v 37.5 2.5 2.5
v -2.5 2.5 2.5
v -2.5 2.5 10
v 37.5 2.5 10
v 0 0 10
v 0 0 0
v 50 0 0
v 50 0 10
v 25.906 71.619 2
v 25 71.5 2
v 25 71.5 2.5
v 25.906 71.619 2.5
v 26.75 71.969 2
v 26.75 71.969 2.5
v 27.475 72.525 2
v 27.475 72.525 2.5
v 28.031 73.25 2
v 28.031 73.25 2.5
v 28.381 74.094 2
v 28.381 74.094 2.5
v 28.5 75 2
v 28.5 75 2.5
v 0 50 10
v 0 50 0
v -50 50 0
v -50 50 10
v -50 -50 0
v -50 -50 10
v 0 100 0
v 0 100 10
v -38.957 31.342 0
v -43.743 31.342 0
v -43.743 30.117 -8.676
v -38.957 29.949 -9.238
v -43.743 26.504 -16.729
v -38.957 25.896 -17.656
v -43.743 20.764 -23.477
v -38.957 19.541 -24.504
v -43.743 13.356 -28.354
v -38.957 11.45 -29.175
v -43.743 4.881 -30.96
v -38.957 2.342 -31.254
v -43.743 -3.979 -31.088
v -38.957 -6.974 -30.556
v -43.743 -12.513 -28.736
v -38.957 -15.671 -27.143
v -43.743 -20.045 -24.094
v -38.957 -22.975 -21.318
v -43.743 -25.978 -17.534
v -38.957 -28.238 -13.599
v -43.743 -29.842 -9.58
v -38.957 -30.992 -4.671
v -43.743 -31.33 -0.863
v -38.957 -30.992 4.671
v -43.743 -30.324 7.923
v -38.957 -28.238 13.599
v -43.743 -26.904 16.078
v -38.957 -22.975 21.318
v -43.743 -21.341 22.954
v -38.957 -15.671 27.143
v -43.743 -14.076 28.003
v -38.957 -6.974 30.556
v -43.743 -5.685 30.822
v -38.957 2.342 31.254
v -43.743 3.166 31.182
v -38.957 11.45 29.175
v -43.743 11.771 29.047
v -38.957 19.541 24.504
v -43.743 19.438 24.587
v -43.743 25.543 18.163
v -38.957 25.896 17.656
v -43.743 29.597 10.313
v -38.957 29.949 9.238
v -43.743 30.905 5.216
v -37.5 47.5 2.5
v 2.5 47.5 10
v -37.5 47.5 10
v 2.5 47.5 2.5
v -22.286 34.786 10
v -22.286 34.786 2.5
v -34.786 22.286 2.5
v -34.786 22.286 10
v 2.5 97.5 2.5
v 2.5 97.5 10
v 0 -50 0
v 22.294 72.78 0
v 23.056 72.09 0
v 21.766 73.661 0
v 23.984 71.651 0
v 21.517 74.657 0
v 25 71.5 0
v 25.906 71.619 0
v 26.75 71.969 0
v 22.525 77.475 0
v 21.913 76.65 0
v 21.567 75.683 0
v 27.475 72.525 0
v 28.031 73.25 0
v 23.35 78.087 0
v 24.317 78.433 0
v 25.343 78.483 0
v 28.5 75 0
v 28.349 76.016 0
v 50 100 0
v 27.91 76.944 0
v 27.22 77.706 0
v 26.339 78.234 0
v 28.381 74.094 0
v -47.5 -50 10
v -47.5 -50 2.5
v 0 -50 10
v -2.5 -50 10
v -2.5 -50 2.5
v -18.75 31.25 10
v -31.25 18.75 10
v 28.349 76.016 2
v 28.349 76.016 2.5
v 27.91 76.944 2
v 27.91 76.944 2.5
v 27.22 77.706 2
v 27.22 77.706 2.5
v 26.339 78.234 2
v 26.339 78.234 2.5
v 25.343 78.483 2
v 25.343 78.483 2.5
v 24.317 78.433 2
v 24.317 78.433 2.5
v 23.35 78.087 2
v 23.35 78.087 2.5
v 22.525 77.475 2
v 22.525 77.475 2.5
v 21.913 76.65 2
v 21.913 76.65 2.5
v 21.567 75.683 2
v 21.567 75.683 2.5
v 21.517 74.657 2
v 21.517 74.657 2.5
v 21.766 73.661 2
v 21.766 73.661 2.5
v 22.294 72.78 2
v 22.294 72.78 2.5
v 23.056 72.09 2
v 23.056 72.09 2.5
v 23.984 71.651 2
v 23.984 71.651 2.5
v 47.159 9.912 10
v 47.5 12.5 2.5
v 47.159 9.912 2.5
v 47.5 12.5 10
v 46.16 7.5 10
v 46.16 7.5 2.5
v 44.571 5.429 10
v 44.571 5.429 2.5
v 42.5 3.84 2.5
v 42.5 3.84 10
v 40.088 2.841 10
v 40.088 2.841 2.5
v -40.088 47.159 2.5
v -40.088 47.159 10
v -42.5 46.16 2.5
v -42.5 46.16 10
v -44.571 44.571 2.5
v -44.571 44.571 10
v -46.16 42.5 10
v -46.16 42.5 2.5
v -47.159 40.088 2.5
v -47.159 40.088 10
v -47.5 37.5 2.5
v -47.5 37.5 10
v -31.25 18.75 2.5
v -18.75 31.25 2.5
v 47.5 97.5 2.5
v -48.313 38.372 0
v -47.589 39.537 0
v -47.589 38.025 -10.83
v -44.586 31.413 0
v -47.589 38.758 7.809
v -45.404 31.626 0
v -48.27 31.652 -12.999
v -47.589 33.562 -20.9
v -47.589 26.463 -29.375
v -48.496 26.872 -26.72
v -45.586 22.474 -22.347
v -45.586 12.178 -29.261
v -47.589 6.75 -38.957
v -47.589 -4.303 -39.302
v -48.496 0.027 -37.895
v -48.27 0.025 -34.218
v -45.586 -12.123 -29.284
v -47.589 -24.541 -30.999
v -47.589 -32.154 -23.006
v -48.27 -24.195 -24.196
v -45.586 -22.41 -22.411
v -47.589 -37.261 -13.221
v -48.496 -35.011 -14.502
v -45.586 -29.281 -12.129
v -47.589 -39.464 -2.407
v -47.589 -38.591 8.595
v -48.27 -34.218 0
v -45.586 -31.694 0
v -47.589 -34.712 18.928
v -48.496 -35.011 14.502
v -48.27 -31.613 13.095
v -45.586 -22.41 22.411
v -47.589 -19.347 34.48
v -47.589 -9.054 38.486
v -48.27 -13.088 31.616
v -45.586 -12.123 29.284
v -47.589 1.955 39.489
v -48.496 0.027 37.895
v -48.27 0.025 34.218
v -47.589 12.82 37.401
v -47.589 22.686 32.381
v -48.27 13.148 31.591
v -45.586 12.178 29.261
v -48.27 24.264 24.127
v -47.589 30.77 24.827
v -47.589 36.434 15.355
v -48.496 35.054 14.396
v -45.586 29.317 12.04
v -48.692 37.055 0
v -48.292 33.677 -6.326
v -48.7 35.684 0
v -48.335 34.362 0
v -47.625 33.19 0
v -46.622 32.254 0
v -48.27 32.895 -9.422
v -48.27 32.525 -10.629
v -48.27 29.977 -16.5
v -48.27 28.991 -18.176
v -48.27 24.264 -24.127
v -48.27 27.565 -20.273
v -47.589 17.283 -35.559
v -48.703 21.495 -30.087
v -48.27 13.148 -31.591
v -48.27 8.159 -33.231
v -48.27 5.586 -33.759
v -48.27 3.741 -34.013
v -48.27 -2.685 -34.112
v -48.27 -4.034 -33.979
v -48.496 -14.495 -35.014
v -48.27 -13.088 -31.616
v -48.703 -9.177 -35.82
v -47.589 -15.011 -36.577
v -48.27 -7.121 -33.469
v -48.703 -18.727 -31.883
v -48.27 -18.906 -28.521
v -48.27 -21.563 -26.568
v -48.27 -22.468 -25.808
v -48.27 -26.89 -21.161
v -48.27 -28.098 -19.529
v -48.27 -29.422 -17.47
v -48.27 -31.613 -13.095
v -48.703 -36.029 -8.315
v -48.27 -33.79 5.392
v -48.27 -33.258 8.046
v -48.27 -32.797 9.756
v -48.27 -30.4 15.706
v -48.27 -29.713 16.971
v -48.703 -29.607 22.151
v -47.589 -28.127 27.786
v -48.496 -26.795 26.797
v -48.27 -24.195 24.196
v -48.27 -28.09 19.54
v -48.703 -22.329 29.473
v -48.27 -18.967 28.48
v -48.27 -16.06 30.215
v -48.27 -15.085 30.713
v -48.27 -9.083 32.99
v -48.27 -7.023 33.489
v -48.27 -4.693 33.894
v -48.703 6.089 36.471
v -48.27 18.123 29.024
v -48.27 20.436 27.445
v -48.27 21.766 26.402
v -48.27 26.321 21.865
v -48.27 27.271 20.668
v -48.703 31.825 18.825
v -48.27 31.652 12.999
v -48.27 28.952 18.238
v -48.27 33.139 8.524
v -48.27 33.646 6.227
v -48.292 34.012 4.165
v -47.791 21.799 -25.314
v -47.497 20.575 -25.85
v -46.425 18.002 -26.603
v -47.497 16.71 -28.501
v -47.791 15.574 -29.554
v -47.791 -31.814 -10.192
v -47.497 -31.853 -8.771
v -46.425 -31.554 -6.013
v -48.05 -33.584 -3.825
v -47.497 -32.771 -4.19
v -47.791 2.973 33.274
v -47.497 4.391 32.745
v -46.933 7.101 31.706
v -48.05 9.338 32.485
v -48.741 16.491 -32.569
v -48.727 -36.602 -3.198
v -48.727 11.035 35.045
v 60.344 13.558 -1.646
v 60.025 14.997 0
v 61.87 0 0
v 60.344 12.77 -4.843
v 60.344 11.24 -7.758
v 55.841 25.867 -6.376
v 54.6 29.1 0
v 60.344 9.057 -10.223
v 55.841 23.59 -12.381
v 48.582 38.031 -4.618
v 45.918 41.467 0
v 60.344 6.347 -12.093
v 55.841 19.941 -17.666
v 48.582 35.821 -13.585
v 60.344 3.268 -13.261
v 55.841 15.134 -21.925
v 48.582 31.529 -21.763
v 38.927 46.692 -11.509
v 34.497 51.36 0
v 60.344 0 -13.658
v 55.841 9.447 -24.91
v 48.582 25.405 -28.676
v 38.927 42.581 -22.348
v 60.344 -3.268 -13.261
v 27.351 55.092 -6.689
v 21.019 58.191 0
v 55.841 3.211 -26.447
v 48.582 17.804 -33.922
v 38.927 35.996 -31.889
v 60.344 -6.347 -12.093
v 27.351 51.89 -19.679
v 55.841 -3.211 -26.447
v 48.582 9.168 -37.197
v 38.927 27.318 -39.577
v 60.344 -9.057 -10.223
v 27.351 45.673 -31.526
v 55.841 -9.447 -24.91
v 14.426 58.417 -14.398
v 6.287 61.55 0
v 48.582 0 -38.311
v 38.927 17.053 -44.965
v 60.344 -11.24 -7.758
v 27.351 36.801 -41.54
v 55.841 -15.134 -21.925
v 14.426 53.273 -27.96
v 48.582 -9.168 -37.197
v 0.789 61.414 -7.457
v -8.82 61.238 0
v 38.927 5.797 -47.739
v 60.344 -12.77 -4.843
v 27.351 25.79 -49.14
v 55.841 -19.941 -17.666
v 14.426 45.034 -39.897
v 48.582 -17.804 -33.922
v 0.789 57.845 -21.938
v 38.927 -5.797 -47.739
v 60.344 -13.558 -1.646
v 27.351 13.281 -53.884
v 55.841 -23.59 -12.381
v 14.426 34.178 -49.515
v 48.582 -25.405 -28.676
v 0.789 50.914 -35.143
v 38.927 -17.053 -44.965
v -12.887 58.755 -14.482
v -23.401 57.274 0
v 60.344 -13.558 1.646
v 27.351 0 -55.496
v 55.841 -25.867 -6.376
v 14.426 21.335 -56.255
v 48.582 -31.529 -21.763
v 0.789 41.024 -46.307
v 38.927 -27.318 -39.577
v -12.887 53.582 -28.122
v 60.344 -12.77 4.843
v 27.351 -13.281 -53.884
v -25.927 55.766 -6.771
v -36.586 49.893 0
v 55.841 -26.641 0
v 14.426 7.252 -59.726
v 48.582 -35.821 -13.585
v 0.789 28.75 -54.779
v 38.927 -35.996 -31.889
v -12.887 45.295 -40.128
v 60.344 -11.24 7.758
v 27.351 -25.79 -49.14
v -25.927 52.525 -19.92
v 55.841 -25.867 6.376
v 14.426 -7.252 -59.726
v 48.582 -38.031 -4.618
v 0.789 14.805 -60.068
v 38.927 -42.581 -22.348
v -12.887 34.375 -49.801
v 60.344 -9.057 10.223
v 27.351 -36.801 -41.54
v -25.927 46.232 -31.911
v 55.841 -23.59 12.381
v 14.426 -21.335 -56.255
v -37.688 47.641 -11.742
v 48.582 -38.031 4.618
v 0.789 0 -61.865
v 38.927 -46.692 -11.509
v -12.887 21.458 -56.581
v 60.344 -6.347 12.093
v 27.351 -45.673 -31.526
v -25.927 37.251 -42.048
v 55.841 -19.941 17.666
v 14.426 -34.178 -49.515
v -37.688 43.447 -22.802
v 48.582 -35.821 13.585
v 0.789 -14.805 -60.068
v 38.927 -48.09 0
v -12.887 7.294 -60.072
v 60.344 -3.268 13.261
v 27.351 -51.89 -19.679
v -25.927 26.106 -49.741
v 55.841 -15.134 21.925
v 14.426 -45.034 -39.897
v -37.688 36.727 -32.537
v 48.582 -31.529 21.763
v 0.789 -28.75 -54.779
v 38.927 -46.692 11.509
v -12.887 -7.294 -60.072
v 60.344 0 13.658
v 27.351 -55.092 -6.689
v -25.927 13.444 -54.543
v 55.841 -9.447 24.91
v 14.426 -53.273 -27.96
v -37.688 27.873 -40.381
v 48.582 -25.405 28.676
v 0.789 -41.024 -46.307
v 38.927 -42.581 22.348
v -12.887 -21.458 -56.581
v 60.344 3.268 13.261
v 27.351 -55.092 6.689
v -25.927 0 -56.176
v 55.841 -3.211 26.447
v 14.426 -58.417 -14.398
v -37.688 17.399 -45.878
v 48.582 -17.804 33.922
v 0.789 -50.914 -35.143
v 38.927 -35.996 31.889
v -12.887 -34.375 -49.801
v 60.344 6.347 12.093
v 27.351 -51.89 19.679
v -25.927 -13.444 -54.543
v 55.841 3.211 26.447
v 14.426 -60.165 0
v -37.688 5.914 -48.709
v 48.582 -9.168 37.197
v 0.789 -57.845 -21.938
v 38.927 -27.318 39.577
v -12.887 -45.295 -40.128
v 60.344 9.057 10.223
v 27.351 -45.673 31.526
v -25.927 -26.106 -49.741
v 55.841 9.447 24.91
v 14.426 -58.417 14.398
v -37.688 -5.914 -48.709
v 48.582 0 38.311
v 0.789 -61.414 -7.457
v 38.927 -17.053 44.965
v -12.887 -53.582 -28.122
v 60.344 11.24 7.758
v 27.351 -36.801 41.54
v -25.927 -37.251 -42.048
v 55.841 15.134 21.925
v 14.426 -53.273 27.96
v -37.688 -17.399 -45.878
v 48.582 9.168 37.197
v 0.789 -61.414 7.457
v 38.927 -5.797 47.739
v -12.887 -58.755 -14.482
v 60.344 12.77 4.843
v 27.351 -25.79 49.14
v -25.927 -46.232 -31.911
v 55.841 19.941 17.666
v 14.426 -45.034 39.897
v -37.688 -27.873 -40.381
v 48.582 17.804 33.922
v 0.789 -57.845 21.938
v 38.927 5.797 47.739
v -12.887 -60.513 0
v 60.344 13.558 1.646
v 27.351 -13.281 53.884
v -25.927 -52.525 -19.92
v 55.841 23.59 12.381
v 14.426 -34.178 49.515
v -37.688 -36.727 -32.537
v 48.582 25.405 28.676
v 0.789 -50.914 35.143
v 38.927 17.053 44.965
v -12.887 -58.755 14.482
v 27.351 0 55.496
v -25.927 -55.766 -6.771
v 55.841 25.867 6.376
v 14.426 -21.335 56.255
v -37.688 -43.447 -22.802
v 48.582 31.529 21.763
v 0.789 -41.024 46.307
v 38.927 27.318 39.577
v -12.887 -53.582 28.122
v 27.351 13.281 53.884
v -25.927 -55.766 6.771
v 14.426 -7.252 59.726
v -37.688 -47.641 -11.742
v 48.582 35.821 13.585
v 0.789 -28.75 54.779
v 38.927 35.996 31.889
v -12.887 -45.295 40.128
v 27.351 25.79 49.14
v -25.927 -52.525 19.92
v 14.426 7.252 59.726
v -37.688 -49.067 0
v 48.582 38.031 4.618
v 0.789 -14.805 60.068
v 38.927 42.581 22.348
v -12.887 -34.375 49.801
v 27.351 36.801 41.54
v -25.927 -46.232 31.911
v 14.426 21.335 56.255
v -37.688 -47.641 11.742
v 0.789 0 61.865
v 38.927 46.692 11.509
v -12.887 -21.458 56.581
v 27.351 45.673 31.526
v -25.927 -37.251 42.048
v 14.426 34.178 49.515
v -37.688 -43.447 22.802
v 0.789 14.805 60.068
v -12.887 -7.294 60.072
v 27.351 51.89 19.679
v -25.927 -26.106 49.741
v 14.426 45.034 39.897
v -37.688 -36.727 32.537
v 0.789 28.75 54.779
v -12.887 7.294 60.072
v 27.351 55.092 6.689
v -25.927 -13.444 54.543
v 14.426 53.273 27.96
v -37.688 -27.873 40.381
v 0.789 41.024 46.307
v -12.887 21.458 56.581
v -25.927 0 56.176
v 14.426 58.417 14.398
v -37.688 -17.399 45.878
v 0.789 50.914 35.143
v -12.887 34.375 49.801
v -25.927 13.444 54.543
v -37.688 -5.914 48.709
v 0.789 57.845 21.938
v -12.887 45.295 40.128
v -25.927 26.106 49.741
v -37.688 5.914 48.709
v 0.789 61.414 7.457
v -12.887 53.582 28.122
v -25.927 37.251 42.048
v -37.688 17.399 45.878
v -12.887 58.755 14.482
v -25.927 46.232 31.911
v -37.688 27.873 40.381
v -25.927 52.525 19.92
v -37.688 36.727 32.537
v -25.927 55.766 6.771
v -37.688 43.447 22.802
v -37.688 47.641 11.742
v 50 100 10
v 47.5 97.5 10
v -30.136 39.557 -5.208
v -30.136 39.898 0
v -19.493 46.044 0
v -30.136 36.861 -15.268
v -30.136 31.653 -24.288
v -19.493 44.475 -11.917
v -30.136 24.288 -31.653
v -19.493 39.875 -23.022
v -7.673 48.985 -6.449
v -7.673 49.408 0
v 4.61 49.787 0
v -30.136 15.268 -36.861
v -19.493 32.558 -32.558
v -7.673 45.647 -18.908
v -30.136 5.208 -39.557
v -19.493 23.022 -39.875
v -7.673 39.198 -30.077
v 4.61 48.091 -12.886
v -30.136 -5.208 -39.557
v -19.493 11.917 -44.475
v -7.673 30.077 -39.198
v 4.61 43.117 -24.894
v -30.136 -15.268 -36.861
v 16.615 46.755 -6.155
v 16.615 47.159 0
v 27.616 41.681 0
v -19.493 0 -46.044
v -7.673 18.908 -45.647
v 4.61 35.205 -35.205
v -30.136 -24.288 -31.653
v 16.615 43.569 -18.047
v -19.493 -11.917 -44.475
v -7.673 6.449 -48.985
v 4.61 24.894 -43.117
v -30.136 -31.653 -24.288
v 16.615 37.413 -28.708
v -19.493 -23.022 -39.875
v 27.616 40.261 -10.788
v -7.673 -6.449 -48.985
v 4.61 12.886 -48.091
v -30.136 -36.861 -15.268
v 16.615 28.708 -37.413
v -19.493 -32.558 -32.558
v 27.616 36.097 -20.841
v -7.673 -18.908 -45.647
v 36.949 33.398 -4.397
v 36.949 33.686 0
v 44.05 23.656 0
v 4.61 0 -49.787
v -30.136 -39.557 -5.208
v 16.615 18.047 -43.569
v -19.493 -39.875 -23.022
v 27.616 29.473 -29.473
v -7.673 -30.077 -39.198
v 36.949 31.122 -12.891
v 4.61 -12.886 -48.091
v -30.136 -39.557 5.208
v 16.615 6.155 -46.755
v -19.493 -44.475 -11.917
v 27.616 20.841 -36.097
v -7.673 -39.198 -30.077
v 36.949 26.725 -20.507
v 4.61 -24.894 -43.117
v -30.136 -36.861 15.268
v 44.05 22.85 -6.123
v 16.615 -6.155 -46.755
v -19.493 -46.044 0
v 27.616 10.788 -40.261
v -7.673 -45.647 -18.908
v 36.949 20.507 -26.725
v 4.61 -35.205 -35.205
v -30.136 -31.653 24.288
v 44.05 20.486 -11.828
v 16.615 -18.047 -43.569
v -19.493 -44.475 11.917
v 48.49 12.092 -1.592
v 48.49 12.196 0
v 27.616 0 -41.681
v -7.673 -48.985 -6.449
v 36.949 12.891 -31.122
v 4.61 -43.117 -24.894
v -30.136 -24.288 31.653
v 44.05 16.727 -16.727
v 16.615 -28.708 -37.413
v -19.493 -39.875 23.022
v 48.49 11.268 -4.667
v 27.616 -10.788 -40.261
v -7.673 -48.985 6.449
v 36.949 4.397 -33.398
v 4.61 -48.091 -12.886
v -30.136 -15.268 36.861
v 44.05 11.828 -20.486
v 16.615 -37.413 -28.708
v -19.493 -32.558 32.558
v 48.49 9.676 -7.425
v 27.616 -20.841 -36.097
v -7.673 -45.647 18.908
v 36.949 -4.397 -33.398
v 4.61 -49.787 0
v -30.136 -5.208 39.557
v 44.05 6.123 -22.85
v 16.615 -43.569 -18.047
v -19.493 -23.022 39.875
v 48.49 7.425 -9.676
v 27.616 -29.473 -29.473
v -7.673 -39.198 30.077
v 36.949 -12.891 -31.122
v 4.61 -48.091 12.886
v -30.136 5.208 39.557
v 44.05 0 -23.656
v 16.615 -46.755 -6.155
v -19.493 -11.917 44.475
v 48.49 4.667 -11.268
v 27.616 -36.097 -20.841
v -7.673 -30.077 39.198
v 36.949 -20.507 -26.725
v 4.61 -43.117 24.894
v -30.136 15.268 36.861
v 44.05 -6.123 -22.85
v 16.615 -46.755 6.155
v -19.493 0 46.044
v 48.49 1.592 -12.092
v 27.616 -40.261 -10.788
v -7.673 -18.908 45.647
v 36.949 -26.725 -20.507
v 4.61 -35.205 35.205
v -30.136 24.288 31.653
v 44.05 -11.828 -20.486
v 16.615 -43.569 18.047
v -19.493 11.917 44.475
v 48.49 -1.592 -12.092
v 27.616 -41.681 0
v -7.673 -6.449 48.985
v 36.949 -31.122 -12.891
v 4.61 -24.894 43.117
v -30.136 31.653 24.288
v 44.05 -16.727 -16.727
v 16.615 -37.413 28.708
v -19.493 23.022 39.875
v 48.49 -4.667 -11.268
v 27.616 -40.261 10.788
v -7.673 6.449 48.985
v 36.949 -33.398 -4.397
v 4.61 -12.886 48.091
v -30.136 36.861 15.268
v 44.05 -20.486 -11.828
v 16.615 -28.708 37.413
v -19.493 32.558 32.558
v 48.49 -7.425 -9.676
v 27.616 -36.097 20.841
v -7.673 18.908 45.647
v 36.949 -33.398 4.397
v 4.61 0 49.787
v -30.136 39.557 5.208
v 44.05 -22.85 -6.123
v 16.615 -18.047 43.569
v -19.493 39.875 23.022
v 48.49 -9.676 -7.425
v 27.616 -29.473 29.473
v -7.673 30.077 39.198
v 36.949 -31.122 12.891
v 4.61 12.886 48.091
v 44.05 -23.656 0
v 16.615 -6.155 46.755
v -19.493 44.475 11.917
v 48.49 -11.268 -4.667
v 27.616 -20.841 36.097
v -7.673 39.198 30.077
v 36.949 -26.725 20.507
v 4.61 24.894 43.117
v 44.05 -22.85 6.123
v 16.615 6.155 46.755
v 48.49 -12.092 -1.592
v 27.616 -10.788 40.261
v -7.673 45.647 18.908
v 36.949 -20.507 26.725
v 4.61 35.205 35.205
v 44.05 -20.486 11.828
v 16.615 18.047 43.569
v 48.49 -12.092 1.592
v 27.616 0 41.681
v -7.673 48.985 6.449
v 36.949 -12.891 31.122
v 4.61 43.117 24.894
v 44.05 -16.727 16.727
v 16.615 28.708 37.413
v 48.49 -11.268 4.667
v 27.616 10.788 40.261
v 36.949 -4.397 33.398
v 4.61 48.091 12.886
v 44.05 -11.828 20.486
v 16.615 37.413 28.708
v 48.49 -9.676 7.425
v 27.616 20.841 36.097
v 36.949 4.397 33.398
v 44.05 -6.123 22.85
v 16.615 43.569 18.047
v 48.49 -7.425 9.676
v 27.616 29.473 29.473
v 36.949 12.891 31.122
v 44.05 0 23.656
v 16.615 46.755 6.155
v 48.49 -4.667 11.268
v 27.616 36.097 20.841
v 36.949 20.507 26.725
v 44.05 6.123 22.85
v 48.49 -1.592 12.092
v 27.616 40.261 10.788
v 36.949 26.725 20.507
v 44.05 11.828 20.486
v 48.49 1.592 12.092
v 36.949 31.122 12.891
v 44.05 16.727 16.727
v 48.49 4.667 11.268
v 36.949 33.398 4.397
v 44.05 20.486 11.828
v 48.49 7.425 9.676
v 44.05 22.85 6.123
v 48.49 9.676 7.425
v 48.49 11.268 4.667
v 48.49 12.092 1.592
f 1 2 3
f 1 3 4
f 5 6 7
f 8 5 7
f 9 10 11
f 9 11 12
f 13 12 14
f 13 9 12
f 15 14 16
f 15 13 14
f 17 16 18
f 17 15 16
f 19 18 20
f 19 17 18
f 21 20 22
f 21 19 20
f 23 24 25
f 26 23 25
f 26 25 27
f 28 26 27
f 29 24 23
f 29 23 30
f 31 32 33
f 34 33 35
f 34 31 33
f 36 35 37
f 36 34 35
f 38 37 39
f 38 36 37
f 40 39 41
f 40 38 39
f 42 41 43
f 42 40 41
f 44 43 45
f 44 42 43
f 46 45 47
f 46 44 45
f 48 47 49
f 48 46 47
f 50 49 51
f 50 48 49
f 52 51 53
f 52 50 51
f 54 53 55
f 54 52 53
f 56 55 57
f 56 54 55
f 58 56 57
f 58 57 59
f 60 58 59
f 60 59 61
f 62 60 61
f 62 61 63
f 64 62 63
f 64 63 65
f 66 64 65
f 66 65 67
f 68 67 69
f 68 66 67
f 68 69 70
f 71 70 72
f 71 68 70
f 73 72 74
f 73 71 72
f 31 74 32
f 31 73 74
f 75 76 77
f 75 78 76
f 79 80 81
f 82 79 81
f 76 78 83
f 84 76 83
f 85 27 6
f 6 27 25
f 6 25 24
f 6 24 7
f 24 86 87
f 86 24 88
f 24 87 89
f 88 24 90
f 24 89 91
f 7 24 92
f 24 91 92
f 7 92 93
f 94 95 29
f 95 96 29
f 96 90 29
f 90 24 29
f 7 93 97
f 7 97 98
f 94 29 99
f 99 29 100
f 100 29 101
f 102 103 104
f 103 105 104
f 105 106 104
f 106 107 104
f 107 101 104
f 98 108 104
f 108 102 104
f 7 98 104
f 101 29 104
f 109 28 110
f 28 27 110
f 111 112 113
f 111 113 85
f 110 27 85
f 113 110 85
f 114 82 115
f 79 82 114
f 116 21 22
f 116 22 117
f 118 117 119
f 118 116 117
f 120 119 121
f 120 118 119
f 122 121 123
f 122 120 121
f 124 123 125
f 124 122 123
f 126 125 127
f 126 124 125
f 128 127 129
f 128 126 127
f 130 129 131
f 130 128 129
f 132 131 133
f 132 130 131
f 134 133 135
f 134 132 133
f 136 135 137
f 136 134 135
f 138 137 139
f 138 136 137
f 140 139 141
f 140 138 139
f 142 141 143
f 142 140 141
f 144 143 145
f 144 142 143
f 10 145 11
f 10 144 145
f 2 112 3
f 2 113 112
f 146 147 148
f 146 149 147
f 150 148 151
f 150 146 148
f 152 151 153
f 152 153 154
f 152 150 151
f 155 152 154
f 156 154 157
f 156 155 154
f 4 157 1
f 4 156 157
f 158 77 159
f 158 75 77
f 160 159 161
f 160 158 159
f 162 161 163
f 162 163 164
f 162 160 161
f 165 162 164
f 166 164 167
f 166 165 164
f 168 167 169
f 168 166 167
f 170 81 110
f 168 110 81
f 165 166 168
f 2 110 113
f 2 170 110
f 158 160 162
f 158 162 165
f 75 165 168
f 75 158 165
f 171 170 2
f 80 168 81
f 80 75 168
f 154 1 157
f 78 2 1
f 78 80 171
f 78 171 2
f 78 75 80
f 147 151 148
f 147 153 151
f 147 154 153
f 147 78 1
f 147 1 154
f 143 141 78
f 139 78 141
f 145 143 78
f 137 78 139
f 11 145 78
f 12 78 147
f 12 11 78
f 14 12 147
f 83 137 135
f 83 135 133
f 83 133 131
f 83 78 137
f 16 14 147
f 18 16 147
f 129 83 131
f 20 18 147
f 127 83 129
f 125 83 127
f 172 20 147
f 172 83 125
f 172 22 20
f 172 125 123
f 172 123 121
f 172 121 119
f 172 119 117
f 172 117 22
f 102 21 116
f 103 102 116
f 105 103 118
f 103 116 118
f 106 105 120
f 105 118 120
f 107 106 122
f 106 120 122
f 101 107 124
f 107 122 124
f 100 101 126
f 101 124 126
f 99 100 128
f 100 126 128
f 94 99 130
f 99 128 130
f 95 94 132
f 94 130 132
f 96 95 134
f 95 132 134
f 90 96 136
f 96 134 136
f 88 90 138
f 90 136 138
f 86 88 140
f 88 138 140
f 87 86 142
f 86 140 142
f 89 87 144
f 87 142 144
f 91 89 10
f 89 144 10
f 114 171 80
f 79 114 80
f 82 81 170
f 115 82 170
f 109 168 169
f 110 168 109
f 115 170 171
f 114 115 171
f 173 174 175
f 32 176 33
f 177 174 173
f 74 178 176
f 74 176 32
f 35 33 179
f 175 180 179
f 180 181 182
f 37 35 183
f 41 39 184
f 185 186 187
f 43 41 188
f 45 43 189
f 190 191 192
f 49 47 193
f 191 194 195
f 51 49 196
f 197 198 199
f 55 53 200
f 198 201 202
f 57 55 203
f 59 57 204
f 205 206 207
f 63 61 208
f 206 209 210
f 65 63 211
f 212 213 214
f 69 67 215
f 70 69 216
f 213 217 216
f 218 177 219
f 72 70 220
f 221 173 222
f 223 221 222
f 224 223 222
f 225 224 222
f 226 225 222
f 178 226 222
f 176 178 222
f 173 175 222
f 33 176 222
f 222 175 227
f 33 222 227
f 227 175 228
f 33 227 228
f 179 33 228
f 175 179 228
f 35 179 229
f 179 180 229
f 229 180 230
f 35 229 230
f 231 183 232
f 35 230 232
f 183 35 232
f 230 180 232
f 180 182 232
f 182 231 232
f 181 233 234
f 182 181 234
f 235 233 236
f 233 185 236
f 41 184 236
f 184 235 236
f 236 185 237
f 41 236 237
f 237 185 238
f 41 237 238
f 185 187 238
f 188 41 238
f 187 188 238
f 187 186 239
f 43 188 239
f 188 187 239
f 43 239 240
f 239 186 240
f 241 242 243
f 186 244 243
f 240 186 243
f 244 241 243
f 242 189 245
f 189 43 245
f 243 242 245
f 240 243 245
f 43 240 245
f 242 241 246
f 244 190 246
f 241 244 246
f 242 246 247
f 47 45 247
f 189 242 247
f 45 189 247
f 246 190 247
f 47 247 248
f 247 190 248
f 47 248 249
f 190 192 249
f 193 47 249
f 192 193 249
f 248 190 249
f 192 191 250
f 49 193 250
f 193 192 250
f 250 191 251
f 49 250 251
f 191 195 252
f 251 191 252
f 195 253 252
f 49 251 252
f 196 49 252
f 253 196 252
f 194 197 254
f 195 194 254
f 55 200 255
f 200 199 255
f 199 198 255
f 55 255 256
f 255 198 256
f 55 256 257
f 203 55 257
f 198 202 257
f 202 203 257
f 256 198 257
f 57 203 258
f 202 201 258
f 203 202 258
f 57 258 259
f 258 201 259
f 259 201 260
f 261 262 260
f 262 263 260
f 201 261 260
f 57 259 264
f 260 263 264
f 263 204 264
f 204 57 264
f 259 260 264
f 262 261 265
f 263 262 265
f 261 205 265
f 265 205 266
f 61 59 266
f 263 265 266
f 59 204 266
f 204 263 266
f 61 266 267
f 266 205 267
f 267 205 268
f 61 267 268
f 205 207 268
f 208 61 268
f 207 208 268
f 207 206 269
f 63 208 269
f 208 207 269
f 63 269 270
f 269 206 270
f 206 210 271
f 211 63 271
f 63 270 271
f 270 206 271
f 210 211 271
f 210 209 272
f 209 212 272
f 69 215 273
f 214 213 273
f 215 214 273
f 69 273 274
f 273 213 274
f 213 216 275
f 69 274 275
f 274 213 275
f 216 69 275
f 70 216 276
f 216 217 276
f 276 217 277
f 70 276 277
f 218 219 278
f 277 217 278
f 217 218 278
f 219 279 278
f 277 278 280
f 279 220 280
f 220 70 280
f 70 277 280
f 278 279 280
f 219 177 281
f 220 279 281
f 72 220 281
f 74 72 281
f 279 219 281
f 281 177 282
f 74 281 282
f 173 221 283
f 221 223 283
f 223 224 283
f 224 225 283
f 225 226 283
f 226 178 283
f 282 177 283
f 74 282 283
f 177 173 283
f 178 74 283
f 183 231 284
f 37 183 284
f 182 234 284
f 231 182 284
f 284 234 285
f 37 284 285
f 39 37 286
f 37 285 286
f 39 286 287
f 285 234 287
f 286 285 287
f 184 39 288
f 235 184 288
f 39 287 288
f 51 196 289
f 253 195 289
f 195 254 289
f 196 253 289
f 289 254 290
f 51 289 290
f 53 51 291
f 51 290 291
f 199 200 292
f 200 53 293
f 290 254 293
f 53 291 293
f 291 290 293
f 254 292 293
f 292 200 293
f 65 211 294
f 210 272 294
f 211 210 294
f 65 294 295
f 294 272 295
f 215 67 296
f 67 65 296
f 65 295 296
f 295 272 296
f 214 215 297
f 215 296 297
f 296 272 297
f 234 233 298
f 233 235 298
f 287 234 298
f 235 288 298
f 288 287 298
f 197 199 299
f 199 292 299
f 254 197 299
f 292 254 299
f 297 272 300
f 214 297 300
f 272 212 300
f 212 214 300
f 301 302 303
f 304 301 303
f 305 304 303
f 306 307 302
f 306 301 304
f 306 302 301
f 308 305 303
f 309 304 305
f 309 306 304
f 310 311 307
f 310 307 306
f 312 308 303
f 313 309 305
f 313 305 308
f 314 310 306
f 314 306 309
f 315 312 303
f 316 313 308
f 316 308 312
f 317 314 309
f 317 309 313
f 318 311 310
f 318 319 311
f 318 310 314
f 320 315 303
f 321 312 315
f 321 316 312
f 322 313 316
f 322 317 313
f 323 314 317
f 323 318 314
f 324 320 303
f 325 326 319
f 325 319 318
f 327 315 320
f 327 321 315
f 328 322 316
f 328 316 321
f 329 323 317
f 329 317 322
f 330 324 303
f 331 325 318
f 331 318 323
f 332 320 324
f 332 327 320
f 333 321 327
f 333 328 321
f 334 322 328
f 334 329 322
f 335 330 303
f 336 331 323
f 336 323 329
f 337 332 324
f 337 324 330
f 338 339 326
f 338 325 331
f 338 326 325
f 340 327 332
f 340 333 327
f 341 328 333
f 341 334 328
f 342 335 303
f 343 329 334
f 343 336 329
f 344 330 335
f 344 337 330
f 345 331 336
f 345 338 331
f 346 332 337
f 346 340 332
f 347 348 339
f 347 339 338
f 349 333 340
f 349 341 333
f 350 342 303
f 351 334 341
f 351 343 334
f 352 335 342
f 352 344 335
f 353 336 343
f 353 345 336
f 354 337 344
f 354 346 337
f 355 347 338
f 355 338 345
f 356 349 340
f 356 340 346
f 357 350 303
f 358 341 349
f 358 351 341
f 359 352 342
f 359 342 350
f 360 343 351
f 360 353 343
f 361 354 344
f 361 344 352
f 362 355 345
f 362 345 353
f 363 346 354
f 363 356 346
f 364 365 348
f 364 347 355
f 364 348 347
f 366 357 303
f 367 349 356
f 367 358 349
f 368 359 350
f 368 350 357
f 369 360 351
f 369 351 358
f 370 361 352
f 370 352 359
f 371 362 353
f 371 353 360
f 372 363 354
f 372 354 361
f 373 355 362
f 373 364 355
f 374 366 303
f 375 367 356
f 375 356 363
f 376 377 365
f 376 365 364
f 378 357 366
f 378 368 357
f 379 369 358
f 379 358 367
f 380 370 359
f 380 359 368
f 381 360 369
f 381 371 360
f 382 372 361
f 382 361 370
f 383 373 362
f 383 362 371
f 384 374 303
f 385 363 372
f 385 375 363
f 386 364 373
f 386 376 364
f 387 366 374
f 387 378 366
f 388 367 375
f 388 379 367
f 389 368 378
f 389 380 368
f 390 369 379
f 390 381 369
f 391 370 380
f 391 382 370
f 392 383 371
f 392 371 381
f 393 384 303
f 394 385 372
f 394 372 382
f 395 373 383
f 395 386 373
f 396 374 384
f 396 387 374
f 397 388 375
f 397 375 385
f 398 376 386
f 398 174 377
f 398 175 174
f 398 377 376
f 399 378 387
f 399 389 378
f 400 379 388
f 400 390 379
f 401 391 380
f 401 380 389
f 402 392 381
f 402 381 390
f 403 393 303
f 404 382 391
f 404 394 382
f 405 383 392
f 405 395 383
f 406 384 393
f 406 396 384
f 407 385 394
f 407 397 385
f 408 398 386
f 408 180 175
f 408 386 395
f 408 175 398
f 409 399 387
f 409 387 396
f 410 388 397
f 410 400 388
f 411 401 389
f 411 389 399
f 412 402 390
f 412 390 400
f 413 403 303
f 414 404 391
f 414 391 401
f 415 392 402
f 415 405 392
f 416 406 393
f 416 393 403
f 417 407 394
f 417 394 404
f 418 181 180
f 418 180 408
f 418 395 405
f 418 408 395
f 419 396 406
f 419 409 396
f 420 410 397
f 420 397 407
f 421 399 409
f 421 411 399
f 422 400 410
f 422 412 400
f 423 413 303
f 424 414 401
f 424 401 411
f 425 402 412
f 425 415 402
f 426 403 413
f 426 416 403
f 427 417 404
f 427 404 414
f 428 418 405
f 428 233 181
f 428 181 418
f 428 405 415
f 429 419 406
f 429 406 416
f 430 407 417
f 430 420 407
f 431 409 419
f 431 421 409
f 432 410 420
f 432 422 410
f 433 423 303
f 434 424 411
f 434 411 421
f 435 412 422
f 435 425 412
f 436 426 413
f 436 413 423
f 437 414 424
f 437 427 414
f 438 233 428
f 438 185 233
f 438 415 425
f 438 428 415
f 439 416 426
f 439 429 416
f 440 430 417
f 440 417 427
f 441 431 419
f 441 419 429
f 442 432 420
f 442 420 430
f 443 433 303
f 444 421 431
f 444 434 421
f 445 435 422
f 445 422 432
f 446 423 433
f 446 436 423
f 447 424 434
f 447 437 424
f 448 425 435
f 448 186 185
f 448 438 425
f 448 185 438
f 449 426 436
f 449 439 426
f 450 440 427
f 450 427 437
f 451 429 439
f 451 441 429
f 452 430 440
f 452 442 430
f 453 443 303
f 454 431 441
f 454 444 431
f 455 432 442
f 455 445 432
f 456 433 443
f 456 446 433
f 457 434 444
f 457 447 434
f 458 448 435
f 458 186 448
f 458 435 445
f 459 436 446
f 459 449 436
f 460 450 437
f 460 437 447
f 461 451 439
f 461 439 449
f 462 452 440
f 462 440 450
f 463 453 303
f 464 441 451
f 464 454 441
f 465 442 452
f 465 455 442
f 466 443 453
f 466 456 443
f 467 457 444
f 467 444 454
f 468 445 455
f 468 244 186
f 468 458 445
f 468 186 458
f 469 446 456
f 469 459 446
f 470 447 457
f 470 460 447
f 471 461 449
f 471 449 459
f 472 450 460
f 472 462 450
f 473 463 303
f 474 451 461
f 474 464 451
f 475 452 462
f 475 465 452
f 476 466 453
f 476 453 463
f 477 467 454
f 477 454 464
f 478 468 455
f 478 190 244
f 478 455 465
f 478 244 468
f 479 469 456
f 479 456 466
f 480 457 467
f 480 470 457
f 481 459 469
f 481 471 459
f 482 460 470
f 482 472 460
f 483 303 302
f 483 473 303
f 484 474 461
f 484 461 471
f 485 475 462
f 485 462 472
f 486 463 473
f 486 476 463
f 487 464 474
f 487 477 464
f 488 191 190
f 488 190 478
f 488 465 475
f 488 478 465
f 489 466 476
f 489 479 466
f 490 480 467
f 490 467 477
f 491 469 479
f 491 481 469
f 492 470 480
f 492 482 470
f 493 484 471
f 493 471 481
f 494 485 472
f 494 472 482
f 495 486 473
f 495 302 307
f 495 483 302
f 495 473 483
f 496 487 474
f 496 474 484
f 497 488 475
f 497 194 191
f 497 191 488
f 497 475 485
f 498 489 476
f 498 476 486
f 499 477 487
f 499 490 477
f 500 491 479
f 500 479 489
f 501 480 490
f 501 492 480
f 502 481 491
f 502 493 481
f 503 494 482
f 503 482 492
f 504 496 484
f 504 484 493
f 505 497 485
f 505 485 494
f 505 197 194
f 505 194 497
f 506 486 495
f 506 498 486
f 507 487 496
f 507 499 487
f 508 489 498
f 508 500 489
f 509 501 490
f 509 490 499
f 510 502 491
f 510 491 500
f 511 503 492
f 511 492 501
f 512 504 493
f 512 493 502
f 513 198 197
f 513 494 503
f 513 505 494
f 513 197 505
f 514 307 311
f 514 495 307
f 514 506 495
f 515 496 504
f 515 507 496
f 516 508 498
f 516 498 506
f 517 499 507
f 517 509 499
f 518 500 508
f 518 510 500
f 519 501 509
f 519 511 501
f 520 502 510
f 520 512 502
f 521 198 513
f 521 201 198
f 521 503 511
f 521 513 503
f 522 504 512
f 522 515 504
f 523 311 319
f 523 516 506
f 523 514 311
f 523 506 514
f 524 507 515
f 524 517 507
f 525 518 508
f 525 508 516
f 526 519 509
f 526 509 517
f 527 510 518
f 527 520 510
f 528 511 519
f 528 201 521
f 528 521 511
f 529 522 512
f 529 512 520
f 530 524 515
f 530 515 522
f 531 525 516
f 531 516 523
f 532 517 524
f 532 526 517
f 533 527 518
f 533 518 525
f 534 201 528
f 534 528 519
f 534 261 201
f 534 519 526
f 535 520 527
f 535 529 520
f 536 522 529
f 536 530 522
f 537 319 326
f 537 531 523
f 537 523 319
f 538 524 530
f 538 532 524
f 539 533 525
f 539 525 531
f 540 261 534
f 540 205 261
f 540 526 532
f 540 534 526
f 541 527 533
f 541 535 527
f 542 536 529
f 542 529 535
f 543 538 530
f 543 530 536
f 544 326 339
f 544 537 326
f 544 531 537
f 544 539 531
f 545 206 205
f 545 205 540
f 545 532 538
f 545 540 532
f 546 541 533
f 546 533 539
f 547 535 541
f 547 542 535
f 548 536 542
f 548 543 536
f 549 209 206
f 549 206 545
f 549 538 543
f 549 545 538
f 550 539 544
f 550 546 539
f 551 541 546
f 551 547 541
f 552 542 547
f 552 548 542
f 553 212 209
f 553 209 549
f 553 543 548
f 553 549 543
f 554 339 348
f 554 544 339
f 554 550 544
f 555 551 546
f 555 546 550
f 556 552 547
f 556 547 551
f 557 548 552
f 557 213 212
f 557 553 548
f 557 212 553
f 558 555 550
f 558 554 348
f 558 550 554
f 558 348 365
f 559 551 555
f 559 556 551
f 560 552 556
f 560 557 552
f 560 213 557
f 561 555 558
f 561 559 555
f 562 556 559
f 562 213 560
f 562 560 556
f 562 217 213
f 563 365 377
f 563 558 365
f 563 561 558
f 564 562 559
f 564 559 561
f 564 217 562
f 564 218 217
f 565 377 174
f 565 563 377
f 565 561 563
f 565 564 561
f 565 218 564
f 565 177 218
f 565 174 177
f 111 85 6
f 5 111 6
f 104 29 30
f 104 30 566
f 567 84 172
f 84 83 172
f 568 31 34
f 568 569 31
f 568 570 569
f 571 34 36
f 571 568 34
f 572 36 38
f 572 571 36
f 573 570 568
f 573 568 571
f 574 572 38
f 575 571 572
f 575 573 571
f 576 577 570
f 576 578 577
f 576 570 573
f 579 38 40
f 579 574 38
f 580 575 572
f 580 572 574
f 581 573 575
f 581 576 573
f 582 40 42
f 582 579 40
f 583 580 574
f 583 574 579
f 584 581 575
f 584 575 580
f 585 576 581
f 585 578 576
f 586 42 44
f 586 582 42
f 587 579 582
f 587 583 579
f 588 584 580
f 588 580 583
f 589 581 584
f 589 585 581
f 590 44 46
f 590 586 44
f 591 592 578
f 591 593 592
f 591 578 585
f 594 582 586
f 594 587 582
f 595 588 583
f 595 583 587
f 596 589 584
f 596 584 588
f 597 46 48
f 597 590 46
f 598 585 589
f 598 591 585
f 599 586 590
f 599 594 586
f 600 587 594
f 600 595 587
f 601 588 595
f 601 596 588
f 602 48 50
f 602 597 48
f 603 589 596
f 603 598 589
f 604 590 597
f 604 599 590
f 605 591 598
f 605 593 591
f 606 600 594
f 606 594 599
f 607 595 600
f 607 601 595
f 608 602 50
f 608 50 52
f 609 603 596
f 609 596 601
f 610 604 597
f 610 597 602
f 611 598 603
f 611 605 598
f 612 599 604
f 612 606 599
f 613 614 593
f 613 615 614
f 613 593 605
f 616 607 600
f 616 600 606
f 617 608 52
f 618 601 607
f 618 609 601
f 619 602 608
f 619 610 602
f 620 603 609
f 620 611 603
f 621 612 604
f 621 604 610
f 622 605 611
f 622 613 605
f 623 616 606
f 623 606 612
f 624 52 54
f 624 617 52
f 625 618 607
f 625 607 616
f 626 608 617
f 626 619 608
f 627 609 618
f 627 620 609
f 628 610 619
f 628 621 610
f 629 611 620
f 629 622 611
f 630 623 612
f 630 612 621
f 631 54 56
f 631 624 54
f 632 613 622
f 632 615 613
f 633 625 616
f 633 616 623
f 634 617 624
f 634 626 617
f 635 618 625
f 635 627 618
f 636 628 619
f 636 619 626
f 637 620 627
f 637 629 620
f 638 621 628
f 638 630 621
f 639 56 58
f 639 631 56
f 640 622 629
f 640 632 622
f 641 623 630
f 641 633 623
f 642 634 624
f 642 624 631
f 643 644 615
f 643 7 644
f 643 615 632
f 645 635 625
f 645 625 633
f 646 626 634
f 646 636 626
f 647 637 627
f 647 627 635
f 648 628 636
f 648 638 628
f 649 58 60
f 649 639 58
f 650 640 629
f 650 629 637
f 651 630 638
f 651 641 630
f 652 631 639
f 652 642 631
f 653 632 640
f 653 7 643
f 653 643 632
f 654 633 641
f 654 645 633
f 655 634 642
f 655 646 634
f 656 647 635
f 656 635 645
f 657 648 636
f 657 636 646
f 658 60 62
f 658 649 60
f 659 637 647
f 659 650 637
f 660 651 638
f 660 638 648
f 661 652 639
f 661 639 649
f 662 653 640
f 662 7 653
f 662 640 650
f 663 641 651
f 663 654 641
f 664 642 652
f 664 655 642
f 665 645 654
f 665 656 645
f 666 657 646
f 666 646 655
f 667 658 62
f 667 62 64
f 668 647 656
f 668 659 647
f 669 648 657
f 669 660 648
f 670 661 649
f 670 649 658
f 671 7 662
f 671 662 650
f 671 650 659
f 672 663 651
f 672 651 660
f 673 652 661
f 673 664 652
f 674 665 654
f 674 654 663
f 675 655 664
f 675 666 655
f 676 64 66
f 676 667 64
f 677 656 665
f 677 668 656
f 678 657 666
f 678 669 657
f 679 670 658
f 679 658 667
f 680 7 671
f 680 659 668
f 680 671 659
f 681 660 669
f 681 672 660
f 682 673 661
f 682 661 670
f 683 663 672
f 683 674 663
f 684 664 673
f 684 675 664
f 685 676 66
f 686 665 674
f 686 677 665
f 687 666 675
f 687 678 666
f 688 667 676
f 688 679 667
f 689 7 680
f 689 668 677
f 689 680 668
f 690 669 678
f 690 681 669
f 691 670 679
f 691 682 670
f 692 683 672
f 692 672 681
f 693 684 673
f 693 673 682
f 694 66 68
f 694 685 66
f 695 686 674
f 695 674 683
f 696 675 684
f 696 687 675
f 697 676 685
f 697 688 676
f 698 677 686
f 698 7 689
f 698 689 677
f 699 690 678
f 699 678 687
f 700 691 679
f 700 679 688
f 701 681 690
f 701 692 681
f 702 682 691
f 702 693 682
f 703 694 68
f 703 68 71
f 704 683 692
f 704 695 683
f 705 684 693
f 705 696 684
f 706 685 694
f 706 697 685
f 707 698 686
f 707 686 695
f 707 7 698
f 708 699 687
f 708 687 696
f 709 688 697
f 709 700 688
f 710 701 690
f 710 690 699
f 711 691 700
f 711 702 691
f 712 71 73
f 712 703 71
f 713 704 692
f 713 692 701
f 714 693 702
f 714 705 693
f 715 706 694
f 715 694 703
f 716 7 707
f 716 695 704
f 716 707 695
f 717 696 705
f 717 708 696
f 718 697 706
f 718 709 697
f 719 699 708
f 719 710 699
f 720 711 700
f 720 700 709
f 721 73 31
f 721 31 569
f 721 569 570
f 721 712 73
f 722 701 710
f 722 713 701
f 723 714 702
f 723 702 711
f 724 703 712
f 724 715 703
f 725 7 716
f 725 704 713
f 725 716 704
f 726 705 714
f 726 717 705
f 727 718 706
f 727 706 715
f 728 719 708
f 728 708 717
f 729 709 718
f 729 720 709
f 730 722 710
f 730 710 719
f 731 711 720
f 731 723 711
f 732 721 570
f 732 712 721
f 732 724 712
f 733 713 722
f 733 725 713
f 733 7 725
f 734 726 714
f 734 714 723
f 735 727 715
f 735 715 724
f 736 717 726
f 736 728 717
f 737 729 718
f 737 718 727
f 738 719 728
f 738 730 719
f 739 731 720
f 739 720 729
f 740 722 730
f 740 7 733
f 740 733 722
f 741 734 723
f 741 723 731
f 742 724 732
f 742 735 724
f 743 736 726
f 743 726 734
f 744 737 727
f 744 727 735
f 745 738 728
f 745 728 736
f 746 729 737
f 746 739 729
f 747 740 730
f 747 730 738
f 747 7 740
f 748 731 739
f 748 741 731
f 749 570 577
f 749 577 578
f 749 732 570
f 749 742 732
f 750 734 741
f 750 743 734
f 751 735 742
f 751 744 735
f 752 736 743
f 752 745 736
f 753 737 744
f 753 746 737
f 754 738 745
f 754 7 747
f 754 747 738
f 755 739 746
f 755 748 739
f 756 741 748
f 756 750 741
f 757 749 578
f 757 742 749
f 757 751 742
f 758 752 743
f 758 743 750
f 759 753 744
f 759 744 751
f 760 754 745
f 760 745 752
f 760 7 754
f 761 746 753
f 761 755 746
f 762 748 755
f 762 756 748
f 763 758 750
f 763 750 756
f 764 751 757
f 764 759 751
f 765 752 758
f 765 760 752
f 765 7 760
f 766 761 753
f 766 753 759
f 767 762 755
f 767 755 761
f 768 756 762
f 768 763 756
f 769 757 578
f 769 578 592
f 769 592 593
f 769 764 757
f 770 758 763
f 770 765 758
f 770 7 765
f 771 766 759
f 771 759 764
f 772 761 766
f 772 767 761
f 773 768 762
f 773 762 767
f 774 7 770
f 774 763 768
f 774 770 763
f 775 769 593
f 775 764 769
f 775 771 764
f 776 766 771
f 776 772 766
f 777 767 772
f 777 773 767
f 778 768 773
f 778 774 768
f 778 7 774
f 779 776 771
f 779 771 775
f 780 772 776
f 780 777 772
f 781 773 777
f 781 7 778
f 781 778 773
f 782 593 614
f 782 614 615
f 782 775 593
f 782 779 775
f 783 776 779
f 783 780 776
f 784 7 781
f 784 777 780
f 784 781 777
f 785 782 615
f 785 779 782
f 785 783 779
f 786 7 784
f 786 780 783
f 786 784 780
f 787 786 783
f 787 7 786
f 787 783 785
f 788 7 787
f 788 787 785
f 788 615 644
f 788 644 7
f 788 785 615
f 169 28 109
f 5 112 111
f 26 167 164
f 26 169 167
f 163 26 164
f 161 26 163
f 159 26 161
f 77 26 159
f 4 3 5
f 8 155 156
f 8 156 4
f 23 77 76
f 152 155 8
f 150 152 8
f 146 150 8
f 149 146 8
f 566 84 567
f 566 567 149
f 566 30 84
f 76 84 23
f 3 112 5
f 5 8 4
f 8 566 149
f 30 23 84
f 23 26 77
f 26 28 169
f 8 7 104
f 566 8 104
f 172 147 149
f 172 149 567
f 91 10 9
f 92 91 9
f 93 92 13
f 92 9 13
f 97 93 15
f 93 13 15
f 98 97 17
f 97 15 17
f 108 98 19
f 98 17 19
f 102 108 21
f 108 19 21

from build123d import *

# Parameters (mm, degrees)
F0_W     = 50
F0_H     = 50
F1_DEPTH = 10
F2_T     = -2.5
F5_DEPTH = 8
F6_R     = 10
F7_DEPTH = 12.5
F10_R    = 5


with BuildPart() as f1:
    # F0 (on Top) → F1 (new body)
    with BuildSketch(Plane.XY):
        with Locations((-25, 25)):
            Rectangle(F0_W, F0_H)
        with Locations((-25, -25)):
            Rectangle(F0_W, F0_H)
        with Locations((25, 25)):
            Rectangle(F0_W, F0_H)
        with Locations((25, 75)):
            Rectangle(F0_W, F0_H)
    extrude(amount=F1_DEPTH)

    # F2
    f2_openings = [f1.faces().sort_by_distance(p)[0] for p in [
        (0, 25, 10),
        (-25, -50, 5),
    ]]
    offset(amount=F2_T, openings=f2_openings, kind=Kind.INTERSECTION)

    # F4 (on offset) → F5 (join)
    with BuildSketch(Plane.XY.offset(2)):
        Polygon((-34.7855339059, 22.2855339059), (-31.25, 18.75), (-25, 25), (-18.75, 31.25), (-22.2855339059, 34.7855339059), (-28.5355339059, 28.5355339059), align=None)
    extrude(amount=F5_DEPTH)

    # F6
    f6_edges = [f1.edges().sort_by_distance(p)[0] for p in [
        (-47.5, 47.5, 6.25),
        (47.5, 2.5, 6.25),
    ]]
    fillet(f6_edges, radius=F6_R)

    # F4 (on offset) → F7 (cut, symmetric)
    with BuildSketch(Plane.XY.offset(2)):
        with BuildLine():
            ThreePointArc((28.5, 75), (22.5251262658, 77.4748737342), (25, 71.5))
            ThreePointArc((25, 71.5), (27.4748737342, 72.5251262658), (28.5, 75))
        make_face()
    extrude(amount=F7_DEPTH, both=True, mode=Mode.SUBTRACT)


with BuildPart() as f9:
    # F8 (on Top) → F9 (revolve)
    with BuildSketch(Plane.XY):
        with BuildLine():
            ThreePointArc((-38.9574993613, 31.3418768346), (16.6151291289, 47.1586416686), (50, 0))
            Line((50, 0), (61.8702455015, 0))
            ThreePointArc((61.8702455015, 0), (16.2404205562, 59.7007204192), (-53.3442971169, 31.3418768346))
            Line((-53.3442971169, 31.3418768346), (-38.9574993613, 31.3418768346))
        make_face()
    revolve(axis=Axis((-56.6923804581, 0, 0), (-1, 0, 0)))

    # F10
    f10_edges = [f9.edges().sort_by_distance(p)[0] for p in [
        (-53.344297, -31.341877, 0),
    ]]
    fillet(f10_edges, radius=F10_R)


solid = Compound([f1.part, f9.part])
